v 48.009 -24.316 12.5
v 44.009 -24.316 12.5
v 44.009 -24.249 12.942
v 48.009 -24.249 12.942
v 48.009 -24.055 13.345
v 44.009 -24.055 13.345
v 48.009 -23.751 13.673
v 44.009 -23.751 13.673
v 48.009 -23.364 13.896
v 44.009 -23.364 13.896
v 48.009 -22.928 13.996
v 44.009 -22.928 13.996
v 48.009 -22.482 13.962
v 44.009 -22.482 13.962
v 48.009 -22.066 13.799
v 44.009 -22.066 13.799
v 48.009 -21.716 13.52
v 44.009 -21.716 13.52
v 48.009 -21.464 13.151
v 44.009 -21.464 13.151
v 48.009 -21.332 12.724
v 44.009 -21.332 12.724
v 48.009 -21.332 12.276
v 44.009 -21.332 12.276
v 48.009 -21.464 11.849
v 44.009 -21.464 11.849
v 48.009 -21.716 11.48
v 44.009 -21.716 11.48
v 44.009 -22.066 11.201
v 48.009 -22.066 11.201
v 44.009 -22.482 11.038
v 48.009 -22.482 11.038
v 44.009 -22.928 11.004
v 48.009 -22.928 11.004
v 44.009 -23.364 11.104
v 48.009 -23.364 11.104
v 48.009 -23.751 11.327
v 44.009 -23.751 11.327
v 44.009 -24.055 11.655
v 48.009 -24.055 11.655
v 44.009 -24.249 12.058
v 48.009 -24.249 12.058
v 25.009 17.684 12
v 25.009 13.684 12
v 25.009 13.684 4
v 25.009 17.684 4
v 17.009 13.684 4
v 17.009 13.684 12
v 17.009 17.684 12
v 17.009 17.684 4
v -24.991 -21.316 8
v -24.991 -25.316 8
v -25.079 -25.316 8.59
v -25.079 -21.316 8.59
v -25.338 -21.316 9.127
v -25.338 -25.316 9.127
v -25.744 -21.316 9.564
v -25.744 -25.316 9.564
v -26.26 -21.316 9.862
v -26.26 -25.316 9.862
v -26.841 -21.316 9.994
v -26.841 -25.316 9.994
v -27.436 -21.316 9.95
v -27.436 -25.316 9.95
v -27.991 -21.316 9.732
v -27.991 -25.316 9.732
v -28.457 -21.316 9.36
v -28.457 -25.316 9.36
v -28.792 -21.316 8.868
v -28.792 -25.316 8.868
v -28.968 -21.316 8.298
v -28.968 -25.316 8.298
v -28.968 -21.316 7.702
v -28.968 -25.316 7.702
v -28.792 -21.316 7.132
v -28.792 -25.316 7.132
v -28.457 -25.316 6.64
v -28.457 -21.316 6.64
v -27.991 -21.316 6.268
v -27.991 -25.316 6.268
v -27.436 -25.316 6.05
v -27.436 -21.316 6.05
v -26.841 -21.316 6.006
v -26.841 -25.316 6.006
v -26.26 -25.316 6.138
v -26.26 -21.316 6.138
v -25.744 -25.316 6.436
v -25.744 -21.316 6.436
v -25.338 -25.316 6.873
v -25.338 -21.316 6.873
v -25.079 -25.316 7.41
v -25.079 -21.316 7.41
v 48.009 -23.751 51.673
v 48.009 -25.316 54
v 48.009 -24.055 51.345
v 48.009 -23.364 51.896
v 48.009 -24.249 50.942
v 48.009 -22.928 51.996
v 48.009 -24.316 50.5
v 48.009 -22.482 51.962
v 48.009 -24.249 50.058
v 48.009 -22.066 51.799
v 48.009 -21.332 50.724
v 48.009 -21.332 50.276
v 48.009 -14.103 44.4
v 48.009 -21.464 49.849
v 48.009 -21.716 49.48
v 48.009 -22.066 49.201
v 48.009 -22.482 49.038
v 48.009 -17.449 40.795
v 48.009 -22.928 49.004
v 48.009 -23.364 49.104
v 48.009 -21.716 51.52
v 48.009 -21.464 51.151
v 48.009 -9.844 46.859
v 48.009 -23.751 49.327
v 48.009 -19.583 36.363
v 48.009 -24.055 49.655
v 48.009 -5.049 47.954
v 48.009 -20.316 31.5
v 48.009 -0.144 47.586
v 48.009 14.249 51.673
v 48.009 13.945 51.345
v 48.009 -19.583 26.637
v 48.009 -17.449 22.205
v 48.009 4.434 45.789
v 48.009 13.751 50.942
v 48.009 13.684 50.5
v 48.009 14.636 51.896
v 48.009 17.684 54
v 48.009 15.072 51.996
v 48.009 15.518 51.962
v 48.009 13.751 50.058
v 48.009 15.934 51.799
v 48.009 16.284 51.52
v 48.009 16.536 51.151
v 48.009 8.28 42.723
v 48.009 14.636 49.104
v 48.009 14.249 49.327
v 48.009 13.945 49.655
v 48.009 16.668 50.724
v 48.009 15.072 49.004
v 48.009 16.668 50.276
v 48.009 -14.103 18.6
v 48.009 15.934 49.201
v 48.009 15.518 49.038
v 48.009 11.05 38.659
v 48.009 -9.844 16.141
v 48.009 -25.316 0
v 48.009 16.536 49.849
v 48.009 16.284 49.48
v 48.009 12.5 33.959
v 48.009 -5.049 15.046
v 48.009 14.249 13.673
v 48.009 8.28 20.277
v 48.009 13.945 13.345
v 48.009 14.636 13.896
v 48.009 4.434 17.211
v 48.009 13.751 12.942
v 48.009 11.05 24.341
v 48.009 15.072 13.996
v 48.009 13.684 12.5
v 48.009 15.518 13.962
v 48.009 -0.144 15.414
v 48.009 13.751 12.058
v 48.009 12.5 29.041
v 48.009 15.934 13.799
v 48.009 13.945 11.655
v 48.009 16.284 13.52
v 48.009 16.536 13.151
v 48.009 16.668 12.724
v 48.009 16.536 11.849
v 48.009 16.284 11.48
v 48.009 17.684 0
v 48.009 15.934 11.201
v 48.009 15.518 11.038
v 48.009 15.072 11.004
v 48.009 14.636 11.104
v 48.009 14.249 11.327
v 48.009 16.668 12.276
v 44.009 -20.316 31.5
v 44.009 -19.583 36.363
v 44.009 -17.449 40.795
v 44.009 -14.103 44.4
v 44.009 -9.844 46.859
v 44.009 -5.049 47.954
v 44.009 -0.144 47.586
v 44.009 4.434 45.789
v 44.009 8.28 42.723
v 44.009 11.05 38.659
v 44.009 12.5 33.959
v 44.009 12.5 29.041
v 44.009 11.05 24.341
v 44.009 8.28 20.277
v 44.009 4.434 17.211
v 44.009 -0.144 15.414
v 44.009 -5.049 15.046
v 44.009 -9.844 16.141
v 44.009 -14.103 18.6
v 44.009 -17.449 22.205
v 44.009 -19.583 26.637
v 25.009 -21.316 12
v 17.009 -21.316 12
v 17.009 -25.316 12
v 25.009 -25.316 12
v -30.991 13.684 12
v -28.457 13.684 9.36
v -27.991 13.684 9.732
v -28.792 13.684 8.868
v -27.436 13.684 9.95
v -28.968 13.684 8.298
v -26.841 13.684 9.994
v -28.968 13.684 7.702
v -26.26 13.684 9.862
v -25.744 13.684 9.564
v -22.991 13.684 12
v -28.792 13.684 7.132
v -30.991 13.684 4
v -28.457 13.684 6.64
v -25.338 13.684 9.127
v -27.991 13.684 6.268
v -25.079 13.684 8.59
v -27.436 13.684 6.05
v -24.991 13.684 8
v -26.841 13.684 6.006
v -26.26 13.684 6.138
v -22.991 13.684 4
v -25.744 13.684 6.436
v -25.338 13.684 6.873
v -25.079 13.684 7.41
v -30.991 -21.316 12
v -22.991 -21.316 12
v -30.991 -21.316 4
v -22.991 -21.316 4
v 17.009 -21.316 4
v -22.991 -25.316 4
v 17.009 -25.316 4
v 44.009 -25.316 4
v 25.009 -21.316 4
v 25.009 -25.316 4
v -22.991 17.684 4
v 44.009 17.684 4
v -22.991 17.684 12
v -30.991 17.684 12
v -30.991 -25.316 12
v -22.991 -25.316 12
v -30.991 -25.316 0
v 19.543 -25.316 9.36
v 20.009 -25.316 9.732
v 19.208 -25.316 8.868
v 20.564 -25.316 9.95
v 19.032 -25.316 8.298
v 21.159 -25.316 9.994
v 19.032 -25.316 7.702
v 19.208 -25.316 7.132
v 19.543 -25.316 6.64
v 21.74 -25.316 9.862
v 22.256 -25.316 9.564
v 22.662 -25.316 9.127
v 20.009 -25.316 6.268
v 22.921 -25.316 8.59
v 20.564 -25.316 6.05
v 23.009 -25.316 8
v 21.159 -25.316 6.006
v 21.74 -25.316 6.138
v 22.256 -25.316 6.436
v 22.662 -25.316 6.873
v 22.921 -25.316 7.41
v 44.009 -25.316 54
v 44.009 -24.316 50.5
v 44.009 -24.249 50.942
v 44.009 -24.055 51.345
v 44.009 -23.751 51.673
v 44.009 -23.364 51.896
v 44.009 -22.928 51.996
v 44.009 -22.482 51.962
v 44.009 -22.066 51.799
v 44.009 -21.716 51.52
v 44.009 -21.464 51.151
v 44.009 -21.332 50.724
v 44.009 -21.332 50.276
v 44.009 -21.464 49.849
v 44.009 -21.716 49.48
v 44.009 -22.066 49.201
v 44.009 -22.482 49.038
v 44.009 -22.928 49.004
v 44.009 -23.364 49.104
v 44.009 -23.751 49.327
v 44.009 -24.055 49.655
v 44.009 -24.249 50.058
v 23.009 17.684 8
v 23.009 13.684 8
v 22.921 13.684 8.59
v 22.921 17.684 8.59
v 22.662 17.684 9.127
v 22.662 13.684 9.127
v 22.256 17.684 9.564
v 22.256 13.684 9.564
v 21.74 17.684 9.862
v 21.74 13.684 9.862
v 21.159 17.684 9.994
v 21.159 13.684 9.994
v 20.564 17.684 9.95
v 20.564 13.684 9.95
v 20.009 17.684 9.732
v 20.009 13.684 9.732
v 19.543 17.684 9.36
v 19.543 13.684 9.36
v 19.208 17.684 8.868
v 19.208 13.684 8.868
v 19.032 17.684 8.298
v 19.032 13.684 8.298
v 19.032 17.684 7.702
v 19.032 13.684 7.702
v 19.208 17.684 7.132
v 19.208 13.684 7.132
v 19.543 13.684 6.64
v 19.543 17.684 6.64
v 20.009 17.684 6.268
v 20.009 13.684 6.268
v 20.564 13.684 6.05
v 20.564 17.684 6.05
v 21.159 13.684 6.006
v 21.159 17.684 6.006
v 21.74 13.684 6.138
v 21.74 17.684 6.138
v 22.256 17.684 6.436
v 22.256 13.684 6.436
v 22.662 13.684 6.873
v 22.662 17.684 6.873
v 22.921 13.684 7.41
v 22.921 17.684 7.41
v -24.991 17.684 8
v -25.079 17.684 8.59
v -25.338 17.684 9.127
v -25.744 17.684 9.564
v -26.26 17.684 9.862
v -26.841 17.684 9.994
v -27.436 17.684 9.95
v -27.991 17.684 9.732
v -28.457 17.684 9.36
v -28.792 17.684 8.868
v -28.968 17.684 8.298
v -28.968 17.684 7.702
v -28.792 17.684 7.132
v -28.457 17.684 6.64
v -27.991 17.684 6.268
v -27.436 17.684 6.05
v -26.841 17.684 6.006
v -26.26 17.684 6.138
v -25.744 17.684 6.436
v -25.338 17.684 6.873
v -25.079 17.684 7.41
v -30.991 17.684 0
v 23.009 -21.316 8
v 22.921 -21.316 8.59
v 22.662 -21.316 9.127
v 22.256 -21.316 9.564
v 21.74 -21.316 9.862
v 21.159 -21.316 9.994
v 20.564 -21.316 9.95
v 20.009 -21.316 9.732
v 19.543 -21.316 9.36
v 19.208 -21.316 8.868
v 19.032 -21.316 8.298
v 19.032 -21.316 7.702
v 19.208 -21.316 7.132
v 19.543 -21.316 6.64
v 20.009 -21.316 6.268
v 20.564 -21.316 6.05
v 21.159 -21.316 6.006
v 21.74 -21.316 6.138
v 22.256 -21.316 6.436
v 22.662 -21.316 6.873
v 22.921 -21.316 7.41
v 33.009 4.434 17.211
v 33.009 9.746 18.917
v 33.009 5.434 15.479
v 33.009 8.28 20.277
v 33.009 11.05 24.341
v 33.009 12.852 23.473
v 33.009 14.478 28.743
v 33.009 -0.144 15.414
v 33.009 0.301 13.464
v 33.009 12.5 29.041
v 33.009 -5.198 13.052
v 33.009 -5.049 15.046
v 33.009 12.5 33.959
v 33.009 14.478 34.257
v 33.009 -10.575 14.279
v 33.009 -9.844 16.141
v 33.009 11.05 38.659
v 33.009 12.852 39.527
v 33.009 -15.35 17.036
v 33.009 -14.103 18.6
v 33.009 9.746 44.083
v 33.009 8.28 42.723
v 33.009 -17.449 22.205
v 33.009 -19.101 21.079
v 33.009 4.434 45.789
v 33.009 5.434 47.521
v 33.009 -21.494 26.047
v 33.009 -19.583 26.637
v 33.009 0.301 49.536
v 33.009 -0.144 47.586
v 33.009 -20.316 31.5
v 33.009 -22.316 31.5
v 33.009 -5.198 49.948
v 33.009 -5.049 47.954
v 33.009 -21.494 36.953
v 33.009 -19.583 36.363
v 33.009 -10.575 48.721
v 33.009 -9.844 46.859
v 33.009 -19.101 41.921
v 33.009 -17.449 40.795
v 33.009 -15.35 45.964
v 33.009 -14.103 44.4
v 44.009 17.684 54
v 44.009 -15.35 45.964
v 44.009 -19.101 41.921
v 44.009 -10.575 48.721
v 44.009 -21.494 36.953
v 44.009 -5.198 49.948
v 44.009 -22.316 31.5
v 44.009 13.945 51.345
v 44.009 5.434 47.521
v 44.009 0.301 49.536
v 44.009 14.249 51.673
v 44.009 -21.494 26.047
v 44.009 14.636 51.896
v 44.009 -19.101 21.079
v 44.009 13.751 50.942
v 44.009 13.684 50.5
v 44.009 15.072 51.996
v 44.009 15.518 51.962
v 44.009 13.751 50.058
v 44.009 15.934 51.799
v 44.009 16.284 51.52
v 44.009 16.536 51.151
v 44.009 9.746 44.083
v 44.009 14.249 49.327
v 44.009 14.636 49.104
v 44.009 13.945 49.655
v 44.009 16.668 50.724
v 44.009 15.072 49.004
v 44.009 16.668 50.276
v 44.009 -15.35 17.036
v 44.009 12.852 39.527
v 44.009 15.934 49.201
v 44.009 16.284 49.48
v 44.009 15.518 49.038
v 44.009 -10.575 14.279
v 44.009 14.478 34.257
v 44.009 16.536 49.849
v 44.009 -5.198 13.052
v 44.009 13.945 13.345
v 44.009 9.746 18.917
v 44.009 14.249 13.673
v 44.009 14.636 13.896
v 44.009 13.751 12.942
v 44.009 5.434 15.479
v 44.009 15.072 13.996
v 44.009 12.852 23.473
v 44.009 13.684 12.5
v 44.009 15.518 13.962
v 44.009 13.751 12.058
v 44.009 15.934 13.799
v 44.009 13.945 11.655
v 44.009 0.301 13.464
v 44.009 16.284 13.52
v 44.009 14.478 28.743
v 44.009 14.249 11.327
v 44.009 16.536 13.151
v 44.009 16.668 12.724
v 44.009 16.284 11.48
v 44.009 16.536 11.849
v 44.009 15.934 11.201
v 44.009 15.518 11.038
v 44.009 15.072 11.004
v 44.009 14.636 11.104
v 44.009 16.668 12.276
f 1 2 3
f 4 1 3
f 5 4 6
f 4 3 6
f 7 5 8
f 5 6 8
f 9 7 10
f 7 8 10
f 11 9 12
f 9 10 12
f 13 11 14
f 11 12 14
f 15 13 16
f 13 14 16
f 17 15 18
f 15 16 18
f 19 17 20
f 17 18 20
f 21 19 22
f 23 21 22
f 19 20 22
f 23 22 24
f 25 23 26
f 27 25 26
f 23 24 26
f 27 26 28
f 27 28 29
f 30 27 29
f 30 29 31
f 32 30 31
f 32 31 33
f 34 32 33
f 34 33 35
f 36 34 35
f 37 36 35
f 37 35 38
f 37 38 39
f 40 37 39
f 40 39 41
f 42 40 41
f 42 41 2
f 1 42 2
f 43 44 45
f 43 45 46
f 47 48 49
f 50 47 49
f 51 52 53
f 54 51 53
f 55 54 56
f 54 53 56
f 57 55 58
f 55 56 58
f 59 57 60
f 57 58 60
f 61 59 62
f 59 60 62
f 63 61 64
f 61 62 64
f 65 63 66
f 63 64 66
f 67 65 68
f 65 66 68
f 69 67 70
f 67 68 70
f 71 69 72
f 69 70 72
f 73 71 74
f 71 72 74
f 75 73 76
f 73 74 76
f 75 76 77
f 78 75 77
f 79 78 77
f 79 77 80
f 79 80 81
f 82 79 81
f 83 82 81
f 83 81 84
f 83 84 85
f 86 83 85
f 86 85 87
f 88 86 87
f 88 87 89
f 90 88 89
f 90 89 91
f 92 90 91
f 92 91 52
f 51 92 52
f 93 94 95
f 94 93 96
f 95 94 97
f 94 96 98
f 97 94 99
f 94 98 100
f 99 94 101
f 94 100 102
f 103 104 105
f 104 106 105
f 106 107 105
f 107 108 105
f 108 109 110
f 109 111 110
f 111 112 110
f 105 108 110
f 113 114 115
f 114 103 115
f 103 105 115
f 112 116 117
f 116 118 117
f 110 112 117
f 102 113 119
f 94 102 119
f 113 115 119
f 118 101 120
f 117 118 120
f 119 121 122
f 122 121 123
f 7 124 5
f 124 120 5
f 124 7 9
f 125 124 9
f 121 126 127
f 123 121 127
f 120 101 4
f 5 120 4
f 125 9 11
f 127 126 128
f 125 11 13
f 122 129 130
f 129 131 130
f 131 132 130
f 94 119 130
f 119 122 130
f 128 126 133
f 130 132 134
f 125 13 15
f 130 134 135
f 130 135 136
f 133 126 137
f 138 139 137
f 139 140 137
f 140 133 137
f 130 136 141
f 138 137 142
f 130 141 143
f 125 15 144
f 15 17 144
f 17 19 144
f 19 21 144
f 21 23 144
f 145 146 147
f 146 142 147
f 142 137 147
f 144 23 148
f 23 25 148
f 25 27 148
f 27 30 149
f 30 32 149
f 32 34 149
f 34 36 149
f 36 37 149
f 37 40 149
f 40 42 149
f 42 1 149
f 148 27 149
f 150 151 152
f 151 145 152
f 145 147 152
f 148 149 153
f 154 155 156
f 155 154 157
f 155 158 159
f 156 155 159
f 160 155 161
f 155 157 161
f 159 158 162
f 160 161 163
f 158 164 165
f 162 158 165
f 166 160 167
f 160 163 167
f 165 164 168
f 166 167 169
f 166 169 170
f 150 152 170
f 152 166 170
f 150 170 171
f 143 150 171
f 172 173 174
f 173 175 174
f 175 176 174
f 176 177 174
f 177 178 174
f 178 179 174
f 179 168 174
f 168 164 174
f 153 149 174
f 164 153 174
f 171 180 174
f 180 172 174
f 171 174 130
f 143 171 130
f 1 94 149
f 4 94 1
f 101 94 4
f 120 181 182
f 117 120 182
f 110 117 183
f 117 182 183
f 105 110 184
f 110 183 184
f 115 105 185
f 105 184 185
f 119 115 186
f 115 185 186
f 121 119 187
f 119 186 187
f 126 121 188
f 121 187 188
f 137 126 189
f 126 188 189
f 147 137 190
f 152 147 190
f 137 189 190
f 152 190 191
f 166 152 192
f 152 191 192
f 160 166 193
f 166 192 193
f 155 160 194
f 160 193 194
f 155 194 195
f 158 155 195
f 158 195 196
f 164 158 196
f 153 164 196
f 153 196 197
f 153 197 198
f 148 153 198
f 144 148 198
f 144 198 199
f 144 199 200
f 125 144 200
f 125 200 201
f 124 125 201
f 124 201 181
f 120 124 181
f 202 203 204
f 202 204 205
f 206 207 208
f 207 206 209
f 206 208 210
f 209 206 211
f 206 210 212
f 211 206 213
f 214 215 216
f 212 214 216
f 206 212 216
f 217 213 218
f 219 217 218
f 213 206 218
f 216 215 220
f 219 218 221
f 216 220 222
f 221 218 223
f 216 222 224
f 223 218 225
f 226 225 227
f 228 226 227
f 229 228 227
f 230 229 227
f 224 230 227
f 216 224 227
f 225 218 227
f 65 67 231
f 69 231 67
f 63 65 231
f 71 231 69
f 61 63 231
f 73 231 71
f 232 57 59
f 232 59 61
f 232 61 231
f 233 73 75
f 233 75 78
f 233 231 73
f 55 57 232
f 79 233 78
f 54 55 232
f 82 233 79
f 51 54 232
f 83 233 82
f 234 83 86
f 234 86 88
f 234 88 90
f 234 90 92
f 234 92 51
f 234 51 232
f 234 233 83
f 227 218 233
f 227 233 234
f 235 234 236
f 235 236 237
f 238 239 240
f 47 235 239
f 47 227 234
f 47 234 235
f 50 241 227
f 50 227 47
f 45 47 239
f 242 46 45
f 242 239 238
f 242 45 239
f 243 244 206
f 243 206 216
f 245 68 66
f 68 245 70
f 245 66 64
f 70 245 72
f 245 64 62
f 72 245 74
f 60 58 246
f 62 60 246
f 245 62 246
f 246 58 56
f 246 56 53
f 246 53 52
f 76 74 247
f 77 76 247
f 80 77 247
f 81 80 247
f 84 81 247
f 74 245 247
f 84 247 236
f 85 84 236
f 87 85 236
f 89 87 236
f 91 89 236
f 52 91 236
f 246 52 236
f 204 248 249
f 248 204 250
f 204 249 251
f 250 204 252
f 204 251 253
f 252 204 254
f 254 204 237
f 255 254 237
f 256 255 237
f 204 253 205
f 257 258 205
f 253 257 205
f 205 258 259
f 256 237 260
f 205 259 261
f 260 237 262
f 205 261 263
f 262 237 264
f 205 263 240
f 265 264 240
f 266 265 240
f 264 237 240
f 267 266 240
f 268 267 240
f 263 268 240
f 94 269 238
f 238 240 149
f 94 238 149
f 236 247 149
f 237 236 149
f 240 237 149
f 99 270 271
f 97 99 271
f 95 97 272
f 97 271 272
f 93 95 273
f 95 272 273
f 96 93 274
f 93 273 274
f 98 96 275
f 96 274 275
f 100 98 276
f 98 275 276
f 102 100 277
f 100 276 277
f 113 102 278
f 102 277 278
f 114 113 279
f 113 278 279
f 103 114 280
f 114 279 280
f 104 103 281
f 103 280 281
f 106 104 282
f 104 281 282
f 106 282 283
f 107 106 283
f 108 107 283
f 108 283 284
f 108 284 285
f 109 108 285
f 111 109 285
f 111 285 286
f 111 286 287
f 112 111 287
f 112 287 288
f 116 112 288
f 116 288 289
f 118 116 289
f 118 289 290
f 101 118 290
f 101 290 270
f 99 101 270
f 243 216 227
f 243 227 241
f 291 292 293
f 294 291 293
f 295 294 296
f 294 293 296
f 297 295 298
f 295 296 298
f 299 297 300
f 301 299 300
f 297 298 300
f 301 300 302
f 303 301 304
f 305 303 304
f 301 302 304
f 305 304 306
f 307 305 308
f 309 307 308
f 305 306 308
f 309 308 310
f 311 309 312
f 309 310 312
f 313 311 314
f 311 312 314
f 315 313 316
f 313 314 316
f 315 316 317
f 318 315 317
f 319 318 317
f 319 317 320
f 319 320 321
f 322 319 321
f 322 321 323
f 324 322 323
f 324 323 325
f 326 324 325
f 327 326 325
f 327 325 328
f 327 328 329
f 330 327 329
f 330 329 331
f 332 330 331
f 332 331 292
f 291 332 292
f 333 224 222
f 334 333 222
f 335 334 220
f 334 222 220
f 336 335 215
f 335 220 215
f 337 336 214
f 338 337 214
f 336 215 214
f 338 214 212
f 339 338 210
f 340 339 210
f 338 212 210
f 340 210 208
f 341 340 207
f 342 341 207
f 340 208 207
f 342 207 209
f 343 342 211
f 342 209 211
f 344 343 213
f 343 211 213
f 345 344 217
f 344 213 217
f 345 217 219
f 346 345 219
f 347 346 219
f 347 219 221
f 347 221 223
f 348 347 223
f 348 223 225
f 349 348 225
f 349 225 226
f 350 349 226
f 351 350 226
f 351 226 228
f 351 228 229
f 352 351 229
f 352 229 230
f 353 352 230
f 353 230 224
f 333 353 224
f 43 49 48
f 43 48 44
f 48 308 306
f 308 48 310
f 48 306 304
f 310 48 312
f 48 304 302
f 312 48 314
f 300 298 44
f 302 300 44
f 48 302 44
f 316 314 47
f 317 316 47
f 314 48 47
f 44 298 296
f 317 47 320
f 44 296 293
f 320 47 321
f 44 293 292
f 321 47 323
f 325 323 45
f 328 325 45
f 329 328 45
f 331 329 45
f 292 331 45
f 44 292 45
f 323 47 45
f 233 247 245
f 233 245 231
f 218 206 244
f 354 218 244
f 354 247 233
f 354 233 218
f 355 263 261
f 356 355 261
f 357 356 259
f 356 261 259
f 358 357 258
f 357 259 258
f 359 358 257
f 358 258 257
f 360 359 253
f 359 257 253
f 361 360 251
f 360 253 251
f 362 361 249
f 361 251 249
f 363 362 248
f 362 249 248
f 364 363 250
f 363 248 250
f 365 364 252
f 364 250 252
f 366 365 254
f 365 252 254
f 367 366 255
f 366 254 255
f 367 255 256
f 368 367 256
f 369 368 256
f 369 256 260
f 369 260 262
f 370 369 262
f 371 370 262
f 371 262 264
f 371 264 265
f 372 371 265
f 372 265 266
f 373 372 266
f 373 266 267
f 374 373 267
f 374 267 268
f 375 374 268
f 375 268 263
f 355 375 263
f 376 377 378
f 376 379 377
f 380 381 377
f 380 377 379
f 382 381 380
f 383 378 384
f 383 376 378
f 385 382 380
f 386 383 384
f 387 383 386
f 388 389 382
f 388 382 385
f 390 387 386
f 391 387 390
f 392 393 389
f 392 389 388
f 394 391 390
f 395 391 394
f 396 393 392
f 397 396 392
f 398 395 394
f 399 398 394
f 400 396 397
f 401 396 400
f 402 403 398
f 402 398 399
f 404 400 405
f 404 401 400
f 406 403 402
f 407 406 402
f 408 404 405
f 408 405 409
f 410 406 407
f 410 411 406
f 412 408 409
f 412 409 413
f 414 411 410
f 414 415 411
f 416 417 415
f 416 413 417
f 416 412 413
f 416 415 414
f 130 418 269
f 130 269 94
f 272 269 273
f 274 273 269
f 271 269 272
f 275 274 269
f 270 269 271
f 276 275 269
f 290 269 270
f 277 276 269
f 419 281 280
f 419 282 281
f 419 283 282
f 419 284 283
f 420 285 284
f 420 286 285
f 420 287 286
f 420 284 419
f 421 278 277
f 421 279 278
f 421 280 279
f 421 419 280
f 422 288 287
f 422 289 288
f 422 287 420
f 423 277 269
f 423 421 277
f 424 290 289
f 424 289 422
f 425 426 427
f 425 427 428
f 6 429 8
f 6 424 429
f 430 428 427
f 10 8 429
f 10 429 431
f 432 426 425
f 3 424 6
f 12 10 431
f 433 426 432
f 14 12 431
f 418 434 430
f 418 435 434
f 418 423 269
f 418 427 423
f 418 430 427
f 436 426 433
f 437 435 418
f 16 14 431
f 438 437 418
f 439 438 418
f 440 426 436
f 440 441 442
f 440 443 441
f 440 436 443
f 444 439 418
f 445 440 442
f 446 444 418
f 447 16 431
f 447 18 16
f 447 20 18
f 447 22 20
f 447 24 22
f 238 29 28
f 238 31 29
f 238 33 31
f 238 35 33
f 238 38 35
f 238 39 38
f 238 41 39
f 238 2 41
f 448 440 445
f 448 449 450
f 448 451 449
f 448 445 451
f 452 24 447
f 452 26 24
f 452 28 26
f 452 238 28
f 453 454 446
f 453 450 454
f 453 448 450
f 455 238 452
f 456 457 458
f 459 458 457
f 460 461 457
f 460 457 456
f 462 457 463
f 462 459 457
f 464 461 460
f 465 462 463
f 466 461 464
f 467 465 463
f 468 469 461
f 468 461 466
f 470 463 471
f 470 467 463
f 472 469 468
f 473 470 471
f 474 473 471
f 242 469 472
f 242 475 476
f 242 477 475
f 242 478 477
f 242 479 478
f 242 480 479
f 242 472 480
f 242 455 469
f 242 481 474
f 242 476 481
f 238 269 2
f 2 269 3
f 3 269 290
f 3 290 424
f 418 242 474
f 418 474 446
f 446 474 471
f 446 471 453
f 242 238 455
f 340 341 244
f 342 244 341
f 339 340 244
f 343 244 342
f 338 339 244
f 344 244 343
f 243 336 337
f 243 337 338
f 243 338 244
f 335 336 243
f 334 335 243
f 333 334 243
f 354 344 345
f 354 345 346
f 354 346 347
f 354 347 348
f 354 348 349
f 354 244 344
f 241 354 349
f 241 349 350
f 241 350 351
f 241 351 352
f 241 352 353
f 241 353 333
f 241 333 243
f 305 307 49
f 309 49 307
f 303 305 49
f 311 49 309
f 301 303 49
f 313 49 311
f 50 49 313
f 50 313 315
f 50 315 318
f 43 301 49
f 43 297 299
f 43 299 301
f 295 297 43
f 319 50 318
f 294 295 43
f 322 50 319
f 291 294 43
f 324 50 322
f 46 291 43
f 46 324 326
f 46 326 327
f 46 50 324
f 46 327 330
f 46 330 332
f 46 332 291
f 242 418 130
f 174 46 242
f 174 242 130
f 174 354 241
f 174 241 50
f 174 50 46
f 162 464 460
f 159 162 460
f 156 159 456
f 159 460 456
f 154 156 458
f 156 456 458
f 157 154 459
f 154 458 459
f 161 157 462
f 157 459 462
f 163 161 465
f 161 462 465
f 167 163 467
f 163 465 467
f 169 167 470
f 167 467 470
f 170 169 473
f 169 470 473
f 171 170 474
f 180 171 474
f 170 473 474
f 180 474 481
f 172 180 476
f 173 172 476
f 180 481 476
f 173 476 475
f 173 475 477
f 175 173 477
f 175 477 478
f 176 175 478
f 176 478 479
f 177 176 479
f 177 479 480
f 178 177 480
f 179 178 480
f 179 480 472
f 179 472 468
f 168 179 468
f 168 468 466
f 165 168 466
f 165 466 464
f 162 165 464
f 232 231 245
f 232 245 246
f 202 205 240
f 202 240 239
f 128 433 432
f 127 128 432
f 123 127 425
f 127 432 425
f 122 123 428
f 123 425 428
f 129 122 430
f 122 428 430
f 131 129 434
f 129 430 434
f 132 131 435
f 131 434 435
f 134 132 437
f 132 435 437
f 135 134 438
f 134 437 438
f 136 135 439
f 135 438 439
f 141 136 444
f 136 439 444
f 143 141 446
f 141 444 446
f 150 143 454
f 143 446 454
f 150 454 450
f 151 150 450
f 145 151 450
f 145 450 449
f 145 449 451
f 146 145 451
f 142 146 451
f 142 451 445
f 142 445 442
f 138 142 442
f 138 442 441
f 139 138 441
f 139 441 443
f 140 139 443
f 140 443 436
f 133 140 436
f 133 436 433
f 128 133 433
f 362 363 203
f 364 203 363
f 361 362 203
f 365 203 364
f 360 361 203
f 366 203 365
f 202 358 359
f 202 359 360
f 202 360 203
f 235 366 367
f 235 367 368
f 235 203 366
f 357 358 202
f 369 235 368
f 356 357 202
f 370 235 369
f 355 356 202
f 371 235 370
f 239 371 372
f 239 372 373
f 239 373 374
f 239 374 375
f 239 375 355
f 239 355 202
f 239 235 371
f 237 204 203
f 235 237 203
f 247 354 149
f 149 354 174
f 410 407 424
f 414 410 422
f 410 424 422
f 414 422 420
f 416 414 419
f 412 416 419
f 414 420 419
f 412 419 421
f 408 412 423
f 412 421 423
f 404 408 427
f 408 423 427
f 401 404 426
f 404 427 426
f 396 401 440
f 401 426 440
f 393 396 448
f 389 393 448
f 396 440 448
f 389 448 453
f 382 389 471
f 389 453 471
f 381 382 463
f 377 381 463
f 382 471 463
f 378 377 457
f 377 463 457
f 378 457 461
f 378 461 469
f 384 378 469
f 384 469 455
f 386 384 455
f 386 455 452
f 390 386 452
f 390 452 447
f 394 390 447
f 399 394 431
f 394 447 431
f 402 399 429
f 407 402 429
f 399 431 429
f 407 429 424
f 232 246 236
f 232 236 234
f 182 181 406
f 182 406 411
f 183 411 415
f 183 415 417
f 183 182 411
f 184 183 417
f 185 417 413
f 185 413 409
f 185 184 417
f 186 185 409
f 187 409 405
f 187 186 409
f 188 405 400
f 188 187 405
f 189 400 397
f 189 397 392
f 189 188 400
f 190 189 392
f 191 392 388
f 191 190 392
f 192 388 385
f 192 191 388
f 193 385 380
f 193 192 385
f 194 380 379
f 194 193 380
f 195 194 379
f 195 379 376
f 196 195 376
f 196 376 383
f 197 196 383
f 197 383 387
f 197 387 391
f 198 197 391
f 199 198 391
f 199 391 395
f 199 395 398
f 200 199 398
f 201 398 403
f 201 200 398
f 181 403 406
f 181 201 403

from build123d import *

# Parameters (mm, degrees)
F0_W      = 79
F0_H      = 43
F1_DEPTH  = 4
F2_W      = 4
F2_H      = 43
F3_DEPTH  = 50
F4_W      = 8
F4_H      = 4
F5_DEPTH  = 8
F6_W      = 8
F6_H      = 4
F7_DEPTH  = 8
F8_W      = 8
F8_H      = 4
F9_DEPTH  = 8
F10_W     = 8
F10_H     = 4
F11_DEPTH = 8
F13_D     = 4
F13_DEPTH = 4.001
F15_D     = 4
F15_DEPTH = 4.001
F17_D     = 4
F19_D     = 4
F21_D     = 33
F22_R     = 18.5
F22_R_2   = 16.5
F23_DEPTH = 11
F25_D     = 3
F27_D     = 3
F29_D     = 3
F29_DEPTH = 12
F29_TIP   = 0.9012909285
F31_D     = 3
F31_DEPTH = 12
F31_TIP   = 0.9012909285


with BuildPart() as f1:
    # F0 (on Top) → F1 (new body)
    with BuildSketch(Plane.XY):
        with Locations((8.5094775558, -3.8157299012)):
            Rectangle(F0_W, F0_H)
    extrude(amount=F1_DEPTH)

    # F2 (on face) → F3 (join)
    with BuildSketch(Plane.XY.offset(4)):
        with Locations((46.0094775558, -3.8157299012)):
            Rectangle(F2_W, F2_H)
    extrude(amount=F3_DEPTH)

    # F4 (on face) → F5 (join)
    with BuildSketch(Plane.XY.offset(4)):
        with Locations((-26.9905224442, -23.3157299012)):
            Rectangle(F4_W, F4_H)
    extrude(amount=F5_DEPTH)

    # F6 (on face) → F7 (join)
    with BuildSketch(Plane.XY.offset(4)):
        with Locations((-26.9905224442, 15.6842700988)):
            Rectangle(F6_W, F6_H)
    extrude(amount=F7_DEPTH)

    # F8 (on face) → F9 (join)
    with BuildSketch(Plane.XY.offset(4)):
        with Locations((21.0094775558, 15.6842700988)):
            Rectangle(F8_W, F8_H)
    extrude(amount=F9_DEPTH)

    # F10 (on face) → F11 (join)
    with BuildSketch(Plane.XY.offset(4)):
        with Locations((21.0094775558, -23.3157299012)):
            Rectangle(F10_W, F10_H)
    extrude(amount=F11_DEPTH)

    # F13 (through all, one way)
    with BuildSketch(Plane.XZ.offset(-13.6842700988)):
        with Locations((-26.9905224442, 8)):
            Circle(F13_D / 2)
    extrude(amount=-F13_DEPTH, mode=Mode.SUBTRACT)

    # F15 (through all, one way)
    with BuildSketch(Plane.XZ.offset(-13.6842700988)):
        with Locations((21.0094775558, 8)):
            Circle(F15_D / 2)
    extrude(amount=-F15_DEPTH, mode=Mode.SUBTRACT)

    # F17 (through all)
    with Locations(Plane(origin=(0, -21.3157299012, 0), x_dir=(-1, 0, 0), z_dir=(0, 1, 0))):
        with Locations((26.9905224442, 8)):
            Hole(F17_D / 2)

    # F19 (through all)
    with Locations(Plane(origin=(0, -21.3157299012, 0), x_dir=(-1, 0, 0), z_dir=(0, 1, 0))):
        with Locations((-21.0094775558, 8)):
            Hole(F19_D / 2)

    # F21 (through all)
    with Locations(Plane.YZ.offset(48.0094775558)):
        with Locations((-3.8157299012, 31.5)):
            Hole(F21_D / 2)

    # F22 (on face) → F23 (join)
    with BuildSketch(Plane(origin=(44.0094775558, 0, 0), x_dir=(0, -1, 0), z_dir=(-1, 0, 0))):
        with Locations((3.8157299012, 31.5)):
            Circle(F22_R)
        with Locations((3.8157299012, 31.5)):
            Circle(F22_R_2, mode=Mode.SUBTRACT)
    extrude(amount=F23_DEPTH)

    # F25 (through all)
    with Locations(Plane.YZ.offset(48.0094775558)):
        with Locations((-22.8157299012, 50.5)):
            Hole(F25_D / 2)

    # F27 (through all)
    with Locations(Plane.YZ.offset(48.0094775558)):
        with Locations((15.1842700988, 50.5)):
            Hole(F27_D / 2)

    # F29
    with Locations(Plane.YZ.offset(48.0094775558)):
        with Locations((-22.8157299012, 12.5)):
            Hole(F29_D / 2, depth=F29_DEPTH)
            with Locations((0, 0, -(F29_DEPTH + F29_TIP / 2))):  # 118° drill point
                Cone(0, F29_D / 2, F29_TIP, mode=Mode.SUBTRACT)

    # F31
    with Locations(Plane.YZ.offset(48.0094775558)):
        with Locations((15.1842700988, 12.5)):
            Hole(F31_D / 2, depth=F31_DEPTH)
            with Locations((0, 0, -(F31_DEPTH + F31_TIP / 2))):  # 118° drill point
                Cone(0, F31_D / 2, F31_TIP, mode=Mode.SUBTRACT)


solid = f1.part
